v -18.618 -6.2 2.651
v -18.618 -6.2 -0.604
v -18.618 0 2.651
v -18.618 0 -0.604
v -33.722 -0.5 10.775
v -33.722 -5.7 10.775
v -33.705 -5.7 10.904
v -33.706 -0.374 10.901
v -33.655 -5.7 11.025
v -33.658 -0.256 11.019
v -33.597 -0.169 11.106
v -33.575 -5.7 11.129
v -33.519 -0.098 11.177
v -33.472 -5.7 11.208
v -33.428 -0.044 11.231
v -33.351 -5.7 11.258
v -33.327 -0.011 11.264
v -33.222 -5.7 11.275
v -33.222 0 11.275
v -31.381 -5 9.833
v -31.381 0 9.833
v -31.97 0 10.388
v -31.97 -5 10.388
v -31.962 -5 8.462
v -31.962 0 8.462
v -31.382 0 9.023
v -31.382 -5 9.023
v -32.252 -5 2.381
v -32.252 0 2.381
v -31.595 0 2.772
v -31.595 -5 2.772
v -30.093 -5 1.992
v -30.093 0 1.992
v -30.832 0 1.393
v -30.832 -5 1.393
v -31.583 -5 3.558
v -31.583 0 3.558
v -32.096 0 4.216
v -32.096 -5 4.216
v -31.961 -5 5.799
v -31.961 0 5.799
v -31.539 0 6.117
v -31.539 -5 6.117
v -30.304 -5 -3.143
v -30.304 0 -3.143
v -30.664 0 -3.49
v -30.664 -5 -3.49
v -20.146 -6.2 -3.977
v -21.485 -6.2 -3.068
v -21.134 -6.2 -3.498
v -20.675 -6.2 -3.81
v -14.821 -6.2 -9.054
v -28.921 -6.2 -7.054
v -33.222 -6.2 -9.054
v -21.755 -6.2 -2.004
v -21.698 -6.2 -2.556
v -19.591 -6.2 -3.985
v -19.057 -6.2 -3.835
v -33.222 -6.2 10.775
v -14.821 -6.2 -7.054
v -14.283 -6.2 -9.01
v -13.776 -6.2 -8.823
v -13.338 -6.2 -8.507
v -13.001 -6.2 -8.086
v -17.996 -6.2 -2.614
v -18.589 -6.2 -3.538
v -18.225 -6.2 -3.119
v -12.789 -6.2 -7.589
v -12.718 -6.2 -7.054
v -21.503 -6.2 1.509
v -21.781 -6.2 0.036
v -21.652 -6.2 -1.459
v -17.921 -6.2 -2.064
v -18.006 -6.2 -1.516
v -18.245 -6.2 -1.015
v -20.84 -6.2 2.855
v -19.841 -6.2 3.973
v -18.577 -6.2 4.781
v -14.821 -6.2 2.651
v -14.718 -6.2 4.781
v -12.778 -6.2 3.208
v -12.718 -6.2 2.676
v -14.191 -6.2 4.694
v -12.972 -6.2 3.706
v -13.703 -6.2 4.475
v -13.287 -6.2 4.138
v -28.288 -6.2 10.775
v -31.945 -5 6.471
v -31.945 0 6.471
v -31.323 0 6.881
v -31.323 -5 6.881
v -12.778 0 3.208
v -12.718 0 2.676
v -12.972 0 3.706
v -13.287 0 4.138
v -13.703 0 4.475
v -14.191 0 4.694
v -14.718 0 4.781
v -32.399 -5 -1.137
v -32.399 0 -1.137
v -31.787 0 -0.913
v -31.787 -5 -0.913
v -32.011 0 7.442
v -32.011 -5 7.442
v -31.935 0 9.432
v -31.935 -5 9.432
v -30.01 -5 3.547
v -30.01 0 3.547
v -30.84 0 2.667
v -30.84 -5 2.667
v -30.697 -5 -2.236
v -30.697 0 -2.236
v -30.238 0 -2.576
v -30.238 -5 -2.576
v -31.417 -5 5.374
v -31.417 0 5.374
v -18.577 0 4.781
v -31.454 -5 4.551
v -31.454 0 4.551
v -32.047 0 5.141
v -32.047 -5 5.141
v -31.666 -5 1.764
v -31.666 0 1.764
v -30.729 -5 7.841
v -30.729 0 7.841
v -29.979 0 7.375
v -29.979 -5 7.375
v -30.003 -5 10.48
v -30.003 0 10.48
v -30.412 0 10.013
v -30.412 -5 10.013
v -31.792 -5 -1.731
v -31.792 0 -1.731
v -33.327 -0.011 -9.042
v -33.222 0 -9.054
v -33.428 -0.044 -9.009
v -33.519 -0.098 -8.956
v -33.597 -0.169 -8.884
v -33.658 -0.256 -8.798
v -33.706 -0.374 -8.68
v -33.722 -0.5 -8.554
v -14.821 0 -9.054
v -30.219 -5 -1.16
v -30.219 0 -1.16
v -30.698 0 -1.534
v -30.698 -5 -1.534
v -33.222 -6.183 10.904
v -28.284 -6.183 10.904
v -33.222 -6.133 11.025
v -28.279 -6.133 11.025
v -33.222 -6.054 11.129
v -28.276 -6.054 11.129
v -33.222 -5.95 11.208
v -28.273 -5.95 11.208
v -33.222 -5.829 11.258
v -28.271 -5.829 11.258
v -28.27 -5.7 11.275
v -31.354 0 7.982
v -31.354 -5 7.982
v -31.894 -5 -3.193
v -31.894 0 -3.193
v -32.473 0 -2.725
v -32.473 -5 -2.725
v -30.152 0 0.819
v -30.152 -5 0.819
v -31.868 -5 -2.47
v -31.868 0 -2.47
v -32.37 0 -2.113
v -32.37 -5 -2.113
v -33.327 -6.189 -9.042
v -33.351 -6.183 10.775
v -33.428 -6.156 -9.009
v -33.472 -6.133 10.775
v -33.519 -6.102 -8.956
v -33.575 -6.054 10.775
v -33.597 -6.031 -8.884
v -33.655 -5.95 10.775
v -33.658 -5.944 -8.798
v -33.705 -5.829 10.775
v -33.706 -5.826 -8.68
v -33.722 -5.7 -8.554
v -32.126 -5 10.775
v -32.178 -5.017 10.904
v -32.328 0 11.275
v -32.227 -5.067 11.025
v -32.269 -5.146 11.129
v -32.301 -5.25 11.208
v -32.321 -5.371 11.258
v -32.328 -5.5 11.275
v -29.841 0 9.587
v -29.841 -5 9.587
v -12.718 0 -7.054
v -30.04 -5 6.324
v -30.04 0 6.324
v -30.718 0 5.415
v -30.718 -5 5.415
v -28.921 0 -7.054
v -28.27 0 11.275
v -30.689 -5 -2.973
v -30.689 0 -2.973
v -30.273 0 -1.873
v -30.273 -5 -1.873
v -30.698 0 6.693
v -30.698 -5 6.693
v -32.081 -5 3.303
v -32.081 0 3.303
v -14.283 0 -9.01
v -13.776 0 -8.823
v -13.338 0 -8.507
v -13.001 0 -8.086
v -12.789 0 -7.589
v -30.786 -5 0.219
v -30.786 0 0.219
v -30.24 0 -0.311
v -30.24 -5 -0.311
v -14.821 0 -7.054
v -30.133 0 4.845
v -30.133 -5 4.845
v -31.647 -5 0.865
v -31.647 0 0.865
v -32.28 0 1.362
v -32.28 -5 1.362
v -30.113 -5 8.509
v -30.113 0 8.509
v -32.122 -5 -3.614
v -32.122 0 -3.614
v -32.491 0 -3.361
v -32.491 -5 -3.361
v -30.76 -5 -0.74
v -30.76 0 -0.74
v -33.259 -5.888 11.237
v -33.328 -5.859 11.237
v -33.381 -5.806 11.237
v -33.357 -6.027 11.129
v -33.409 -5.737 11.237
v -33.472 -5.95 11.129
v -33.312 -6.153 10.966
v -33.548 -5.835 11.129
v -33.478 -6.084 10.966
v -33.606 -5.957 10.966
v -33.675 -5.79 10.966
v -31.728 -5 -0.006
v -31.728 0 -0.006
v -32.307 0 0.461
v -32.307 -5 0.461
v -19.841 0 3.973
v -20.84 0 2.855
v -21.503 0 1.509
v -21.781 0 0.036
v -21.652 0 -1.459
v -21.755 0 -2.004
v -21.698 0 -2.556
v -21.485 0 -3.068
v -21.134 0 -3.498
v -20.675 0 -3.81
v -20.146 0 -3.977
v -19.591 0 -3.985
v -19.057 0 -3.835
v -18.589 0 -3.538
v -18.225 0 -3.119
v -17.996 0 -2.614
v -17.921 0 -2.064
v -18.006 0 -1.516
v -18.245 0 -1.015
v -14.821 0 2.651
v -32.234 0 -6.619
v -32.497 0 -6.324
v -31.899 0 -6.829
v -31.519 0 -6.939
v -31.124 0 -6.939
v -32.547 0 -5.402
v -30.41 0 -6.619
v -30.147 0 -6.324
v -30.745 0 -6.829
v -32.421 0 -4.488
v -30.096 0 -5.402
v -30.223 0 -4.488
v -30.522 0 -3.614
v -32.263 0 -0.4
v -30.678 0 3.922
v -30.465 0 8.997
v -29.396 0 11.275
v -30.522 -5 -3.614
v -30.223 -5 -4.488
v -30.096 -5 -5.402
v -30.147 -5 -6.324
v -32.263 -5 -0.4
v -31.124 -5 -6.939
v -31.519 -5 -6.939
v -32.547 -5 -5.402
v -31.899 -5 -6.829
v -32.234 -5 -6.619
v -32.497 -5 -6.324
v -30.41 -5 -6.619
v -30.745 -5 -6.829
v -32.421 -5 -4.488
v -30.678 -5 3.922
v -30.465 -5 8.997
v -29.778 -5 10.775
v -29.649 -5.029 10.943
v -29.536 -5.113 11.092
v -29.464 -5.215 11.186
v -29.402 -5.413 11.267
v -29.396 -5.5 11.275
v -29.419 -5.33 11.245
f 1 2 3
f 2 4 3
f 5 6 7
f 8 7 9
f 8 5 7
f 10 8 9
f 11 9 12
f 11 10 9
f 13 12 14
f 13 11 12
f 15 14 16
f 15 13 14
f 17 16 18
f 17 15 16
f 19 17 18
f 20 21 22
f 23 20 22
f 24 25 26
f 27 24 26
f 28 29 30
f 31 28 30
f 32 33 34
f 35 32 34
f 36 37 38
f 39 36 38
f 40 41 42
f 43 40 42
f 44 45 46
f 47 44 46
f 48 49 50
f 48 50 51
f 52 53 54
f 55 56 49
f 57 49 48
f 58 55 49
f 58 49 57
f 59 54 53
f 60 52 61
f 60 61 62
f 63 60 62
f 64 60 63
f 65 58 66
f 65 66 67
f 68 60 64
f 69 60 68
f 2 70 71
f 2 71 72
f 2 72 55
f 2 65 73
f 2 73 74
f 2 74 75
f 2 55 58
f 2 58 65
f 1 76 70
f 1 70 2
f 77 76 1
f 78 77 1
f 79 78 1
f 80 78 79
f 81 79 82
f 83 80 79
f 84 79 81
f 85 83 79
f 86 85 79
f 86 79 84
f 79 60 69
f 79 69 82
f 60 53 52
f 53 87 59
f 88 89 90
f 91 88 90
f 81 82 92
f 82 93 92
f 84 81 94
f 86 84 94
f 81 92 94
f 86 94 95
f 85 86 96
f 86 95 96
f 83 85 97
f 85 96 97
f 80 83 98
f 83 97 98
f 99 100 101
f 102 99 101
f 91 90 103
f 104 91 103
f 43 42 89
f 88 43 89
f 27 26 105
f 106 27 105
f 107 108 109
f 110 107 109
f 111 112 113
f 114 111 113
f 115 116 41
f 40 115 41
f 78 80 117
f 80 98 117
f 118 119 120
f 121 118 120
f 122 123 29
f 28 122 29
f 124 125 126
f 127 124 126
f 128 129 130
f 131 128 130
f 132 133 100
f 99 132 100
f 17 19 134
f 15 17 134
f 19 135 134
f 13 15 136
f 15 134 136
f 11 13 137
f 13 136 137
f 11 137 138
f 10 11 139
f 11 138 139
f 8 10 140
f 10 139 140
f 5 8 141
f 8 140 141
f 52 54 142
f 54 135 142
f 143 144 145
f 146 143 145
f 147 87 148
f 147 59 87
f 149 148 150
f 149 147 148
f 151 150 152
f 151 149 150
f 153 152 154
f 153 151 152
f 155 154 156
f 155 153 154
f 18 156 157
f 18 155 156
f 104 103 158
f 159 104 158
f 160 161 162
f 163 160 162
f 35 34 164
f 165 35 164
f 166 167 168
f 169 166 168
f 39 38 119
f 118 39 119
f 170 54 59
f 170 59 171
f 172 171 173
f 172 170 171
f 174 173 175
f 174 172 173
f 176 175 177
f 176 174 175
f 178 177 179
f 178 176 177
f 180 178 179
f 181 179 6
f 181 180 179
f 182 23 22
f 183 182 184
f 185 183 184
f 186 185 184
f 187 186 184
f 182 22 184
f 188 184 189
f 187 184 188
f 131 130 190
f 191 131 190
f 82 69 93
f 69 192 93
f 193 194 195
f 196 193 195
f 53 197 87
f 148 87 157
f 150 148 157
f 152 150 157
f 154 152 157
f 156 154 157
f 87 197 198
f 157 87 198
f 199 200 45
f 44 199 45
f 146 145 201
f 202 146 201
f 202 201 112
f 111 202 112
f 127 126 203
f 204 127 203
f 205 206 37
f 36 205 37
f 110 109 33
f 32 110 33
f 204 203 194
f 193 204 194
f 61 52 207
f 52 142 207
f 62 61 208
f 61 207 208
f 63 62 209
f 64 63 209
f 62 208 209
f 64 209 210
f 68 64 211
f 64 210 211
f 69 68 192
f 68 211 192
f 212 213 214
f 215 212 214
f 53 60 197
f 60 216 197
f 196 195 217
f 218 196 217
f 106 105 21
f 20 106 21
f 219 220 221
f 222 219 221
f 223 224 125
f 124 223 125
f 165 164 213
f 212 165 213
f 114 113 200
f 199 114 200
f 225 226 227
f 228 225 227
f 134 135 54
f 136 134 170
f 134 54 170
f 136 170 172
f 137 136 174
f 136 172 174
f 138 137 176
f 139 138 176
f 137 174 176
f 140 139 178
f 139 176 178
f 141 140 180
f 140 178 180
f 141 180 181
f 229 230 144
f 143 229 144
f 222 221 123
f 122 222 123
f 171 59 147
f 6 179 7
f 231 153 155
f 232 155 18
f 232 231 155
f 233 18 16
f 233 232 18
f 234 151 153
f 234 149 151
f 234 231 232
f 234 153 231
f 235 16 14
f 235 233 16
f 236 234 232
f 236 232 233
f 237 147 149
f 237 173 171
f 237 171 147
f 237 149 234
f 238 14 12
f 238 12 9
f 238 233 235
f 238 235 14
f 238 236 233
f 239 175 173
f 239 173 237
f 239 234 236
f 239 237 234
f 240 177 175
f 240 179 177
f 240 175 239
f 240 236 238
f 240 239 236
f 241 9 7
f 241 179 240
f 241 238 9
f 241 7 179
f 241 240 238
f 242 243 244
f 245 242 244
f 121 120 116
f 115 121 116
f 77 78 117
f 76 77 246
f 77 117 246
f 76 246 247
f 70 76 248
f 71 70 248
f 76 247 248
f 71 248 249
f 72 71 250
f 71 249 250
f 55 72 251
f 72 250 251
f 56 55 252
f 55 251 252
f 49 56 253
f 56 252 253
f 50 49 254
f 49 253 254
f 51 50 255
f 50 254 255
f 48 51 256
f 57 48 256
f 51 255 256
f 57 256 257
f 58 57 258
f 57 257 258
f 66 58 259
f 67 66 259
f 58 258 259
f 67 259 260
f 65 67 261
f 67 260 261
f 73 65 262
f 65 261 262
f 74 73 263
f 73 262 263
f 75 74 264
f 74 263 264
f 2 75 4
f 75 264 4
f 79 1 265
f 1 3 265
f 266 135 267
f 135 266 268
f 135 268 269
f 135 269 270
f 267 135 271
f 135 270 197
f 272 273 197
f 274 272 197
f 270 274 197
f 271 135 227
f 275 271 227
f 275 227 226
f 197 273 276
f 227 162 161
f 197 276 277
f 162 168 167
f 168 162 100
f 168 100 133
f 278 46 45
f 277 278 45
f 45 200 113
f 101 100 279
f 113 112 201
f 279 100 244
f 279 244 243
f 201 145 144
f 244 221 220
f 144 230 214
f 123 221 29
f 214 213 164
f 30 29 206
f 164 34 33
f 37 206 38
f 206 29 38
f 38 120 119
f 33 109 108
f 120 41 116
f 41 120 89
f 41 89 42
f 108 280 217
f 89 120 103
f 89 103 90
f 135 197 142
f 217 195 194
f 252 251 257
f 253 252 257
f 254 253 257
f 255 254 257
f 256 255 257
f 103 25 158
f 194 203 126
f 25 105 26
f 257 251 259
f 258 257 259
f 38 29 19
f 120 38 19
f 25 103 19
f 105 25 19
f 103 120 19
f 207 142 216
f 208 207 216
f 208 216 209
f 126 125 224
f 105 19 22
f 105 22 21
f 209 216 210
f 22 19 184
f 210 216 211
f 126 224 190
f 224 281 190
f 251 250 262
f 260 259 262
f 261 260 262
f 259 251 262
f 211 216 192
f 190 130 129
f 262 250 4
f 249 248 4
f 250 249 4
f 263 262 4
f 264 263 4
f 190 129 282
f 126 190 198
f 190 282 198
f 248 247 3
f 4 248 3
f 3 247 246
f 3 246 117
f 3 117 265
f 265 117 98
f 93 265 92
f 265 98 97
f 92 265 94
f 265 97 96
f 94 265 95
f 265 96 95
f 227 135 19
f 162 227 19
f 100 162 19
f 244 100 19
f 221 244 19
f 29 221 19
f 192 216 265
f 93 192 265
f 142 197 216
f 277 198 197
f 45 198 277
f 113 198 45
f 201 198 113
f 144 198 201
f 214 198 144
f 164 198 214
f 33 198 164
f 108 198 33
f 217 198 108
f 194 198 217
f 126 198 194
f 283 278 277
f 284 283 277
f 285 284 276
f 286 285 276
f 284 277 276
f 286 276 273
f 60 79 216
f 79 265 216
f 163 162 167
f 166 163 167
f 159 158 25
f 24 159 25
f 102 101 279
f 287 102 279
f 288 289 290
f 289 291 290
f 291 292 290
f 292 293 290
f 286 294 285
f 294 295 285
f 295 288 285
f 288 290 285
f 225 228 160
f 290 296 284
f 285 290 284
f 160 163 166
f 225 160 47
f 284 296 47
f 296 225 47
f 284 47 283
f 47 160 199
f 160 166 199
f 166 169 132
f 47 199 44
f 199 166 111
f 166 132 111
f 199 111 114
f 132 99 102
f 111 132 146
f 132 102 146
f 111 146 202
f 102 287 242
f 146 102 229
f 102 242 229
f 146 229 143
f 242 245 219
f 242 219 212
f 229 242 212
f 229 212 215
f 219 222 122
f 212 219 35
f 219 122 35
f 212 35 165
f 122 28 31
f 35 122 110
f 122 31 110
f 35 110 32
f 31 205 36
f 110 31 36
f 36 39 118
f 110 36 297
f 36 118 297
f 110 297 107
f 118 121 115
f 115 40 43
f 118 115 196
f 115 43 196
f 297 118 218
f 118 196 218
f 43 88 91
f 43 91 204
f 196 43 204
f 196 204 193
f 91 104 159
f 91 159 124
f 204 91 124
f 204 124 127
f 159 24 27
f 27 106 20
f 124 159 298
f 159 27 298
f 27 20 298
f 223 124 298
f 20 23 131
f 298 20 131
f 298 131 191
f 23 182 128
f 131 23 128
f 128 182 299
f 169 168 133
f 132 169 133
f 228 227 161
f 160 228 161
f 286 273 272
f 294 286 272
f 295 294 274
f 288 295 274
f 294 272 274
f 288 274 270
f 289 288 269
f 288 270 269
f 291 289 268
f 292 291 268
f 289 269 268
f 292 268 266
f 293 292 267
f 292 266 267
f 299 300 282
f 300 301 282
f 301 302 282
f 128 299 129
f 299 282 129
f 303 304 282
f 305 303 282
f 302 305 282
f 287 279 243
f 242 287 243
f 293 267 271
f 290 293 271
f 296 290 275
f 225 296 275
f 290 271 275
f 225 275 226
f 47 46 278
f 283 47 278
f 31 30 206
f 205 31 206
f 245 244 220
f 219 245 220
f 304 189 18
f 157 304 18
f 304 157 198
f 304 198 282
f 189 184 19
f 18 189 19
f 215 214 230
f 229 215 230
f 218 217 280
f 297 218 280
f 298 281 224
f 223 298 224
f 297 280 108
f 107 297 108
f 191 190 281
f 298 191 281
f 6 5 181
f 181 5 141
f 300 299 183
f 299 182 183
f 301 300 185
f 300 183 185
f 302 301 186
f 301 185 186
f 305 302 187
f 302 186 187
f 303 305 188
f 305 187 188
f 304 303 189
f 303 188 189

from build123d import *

# Parameters (mm, degrees)
F1_DEPTH = 5
F3_DEPTH = 1.2
F4_R     = 0.5
F5_R     = 0.5


# Not quite as in the source:
# - a feature names something its author has since deleted; it is built from what else it names


with BuildPart() as f1:
    # F0 (on Front) → F1 (new body)
    with BuildSketch(Plane.XZ):
        with BuildLine():
            Line((-14.8212344469, -7.0536743234), (-28.9212344469, -7.0536743234))
            Line((-28.9212344469, -7.0536743234), (-28.2704247986, 11.2749813125))
            Line((-28.2704247986, 11.2749813125), (-28.9218110621, 11.2749813125))
            Line((-28.9218110621, 11.2749813125), (-29.3961446732, 11.2749813125))
            Line((-29.3961446732, 11.2749813125), (-30.0026237965, 10.4798590764))
            Line((-30.0026237965, 10.4798590764), (-30.4116010666, 10.0127095357))
            Line((-30.4116010666, 10.0127095357), (-29.8413168639, 9.5870485529))
            Line((-29.8413168639, 9.5870485529), (-30.4648373276, 8.9966477826))
            Line((-30.4648373276, 8.9966477826), (-30.1126744598, 8.5086580366))
            Line((-30.1126744598, 8.5086580366), (-30.7294670492, 7.841065526))
            Line((-30.7294670492, 7.841065526), (-29.9794543535, 7.3754815385))
            Line((-29.9794543535, 7.3754815385), (-30.6979243471, 6.6930544935))
            Line((-30.6979243471, 6.6930544935), (-30.0398971885, 6.3235382549))
            Line((-30.0398971885, 6.3235382549), (-30.7178553194, 5.4153422825))
            Line((-30.7178553194, 5.4153422825), (-30.1331207156, 4.8448727466))
            Line((-30.1331207156, 4.8448727466), (-30.6775290519, 3.9221365005))
            Line((-30.6775290519, 3.9221365005), (-30.0103500485, 3.5474810284))
            Line((-30.0103500485, 3.5474810284), (-30.8397468179, 2.6670382358))
            Line((-30.8397468179, 2.6670382358), (-30.092863366, 1.9921413623))
            Line((-30.092863366, 1.9921413623), (-30.8324787766, 1.3930242276))
            Line((-30.8324787766, 1.3930242276), (-30.1521252841, 0.8188846987))
            Line((-30.1521252841, 0.8188846987), (-30.7863112539, 0.2193431865))
            Line((-30.7863112539, 0.2193431865), (-30.2403476089, -0.3106002114))
            Line((-30.2403476089, -0.3106002114), (-30.7600591332, -0.7401480107))
            Line((-30.7600591332, -0.7401480107), (-30.2189867944, -1.1601685546))
            Line((-30.2189867944, -1.1601685546), (-30.697863549, -1.5337655786))
            Line((-30.697863549, -1.5337655786), (-30.272686854, -1.8727472052))
            Line((-30.272686854, -1.8727472052), (-30.6971091777, -2.2358004935))
            Line((-30.6971091777, -2.2358004935), (-30.2377268672, -2.5755497627))
            Line((-30.2377268672, -2.5755497627), (-30.6886751205, -2.9733050615))
            Line((-30.6886751205, -2.9733050615), (-30.3040016443, -3.1427361537))
            Line((-30.3040016443, -3.1427361537), (-30.6638516486, -3.4895907156))
            Line((-30.6638516486, -3.4895907156), (-30.5218110621, -3.6142014433))
            ThreePointArc((-30.5218110621, -3.6142014433), (-30.1374019423, -4.9418633416), (-30.1468068426, -6.3240239819))
            ThreePointArc((-30.1468068426, -6.3240239819), (-31.3218110621, -6.9525761479), (-32.4968152816, -6.3240239819))
            ThreePointArc((-32.4968152816, -6.3240239819), (-32.5062201819, -4.9418633416), (-32.1218110621, -3.6142014433))
            Line((-32.1218110621, -3.6142014433), (-32.4906222522, -3.3608889207))
            Line((-32.4906222522, -3.3608889207), (-31.8935625255, -3.1926007941))
            Line((-31.8935625255, -3.1926007941), (-32.4732549489, -2.725369297))
            Line((-32.4732549489, -2.725369297), (-31.8681225181, -2.469912637))
            Line((-31.8681225181, -2.469912637), (-32.3700606823, -2.1127404179))
            Line((-32.3700606823, -2.1127404179), (-31.7923054099, -1.7308852402))
            Line((-31.7923054099, -1.7308852402), (-32.3993675411, -1.1372548761))
            Line((-32.3993675411, -1.1372548761), (-31.787391752, -0.9133979911))
            Line((-31.787391752, -0.9133979911), (-32.2625972331, -0.3995953302))
            Line((-32.2625972331, -0.3995953302), (-31.7277535796, -0.0062950298))
            Line((-31.7277535796, -0.0062950298), (-32.307446003, 0.4609364551))
            Line((-32.307446003, 0.4609364551), (-31.6469706595, 0.8653931436))
            Line((-31.6469706595, 0.8653931436), (-32.2801508009, 1.3617775403))
            Line((-32.2801508009, 1.3617775403), (-31.6663235426, 1.7637870042))
            Line((-31.6663235426, 1.7637870042), (-32.2516188025, 2.381386701))
            Line((-32.2516188025, 2.381386701), (-31.5948762, 2.771951491))
            Line((-31.5948762, 2.771951491), (-32.0806577802, 3.3034612425))
            Line((-32.0806577802, 3.3034612425), (-31.5831229091, 3.5578387324))
            Line((-31.5831229091, 3.5578387324), (-32.0962779224, 4.2157475837))
            Line((-32.0962779224, 4.2157475837), (-31.4544551075, 4.5507424511))
            Line((-31.4544551075, 4.5507424511), (-32.0472158492, 5.1405578852))
            Line((-32.0472158492, 5.1405578852), (-31.4172059298, 5.3744916804))
            Line((-31.4172059298, 5.3744916804), (-31.9610573351, 5.7992665097))
            Line((-31.9610573351, 5.7992665097), (-31.5387845039, 6.1167036183))
            Line((-31.5387845039, 6.1167036183), (-31.9445021451, 6.4705028199))
            Line((-31.9445021451, 6.4705028199), (-31.3227176666, 6.8809650838))
            Line((-31.3227176666, 6.8809650838), (-32.0109948516, 7.44209392))
            Line((-32.0109948516, 7.44209392), (-31.3543491066, 7.9823648557))
            Line((-31.3543491066, 7.9823648557), (-31.9620929658, 8.4623992443))
            Line((-31.9620929658, 8.4623992443), (-31.3818305731, 9.0230396017))
            Line((-31.3818305731, 9.0230396017), (-31.9348983467, 9.4317272305))
            Line((-31.9348983467, 9.4317272305), (-31.3805788755, 9.8327174783))
            Line((-31.3805788755, 9.8327174783), (-31.9697335362, 10.3881815448))
            Line((-31.9697335362, 10.3881815448), (-32.3277190328, 11.2749813125))
            Line((-32.3277190328, 11.2749813125), (-33.7218110621, 11.2749813125))
            Line((-33.7218110621, 11.2749813125), (-33.7218110621, -9.0536743234))
            Line((-33.7218110621, -9.0536743234), (-14.8212344469, -9.0536743234))
            ThreePointArc((-14.8212344469, -9.0536743234), (-13.3381540877, -8.5073007085), (-12.7176528294, -7.0536743234))
            Line((-12.7176528294, -7.0536743234), (-12.7176528294, 2.67616936))
            ThreePointArc((-12.7176528294, 2.67616936), (-13.2872120436, 4.138004008), (-14.7182294446, 4.7810805465))
            Line((-14.7182294446, 4.7810805465), (-18.5773239742, 4.7810805465))
            ThreePointArc((-18.5773239742, 4.7810805465), (-21.2175552856, 2.2046060367), (-21.6524992138, -1.4587074984))
            ThreePointArc((-21.6524992138, -1.4587074984), (-19.3188346891, -3.9296286003), (-18.6177780154, -0.6039766724))
            Line((-18.6177780154, -0.6039766724), (-18.6177780154, 2.6510965993))
            Line((-18.6177780154, 2.6510965993), (-14.8212344469, 2.6510965993))
            Line((-14.8212344469, 2.6510965993), (-14.8212344469, -7.0536743234))
        make_face()
    extrude(amount=F1_DEPTH)

    # F2 (on face) → F3 (join)
    with BuildSketch(Plane.XZ.offset(5)):
        with BuildLine():
            Line((-32.6968152816, 11.2749813125), (-32.6968152816, -7.0536743234))
            Line((-32.6968152816, -7.0536743234), (-29.3961446732, -7.0536743234))
            Line((-29.3961446732, -7.0536743234), (-29.3961446732, 11.2749813125))
            Line((-29.3961446732, 11.2749813125), (-30.0026237965, 10.4798590764))
            Line((-30.0026237965, 10.4798590764), (-30.4116010666, 10.0127095357))
            Line((-30.4116010666, 10.0127095357), (-29.8413168639, 9.5870485529))
            Line((-29.8413168639, 9.5870485529), (-30.4648373276, 8.9966477826))
            Line((-30.4648373276, 8.9966477826), (-30.1126744598, 8.5086580366))
            Line((-30.1126744598, 8.5086580366), (-30.7294670492, 7.841065526))
            Line((-30.7294670492, 7.841065526), (-29.9794543535, 7.3754815385))
            Line((-29.9794543535, 7.3754815385), (-30.6979243471, 6.6930544935))
            Line((-30.6979243471, 6.6930544935), (-30.0398971885, 6.3235382549))
            Line((-30.0398971885, 6.3235382549), (-30.7178553194, 5.4153422825))
            Line((-30.7178553194, 5.4153422825), (-30.1331207156, 4.8448727466))
            Line((-30.1331207156, 4.8448727466), (-30.6775290519, 3.9221365005))
            Line((-30.6775290519, 3.9221365005), (-30.0103500485, 3.5474810284))
            Line((-30.0103500485, 3.5474810284), (-30.8397468179, 2.6670382358))
            Line((-30.8397468179, 2.6670382358), (-30.092863366, 1.9921413623))
            Line((-30.092863366, 1.9921413623), (-30.8324787766, 1.3930242276))
            Line((-30.8324787766, 1.3930242276), (-30.1521252841, 0.8188846987))
            Line((-30.1521252841, 0.8188846987), (-30.7863112539, 0.2193431865))
            Line((-30.7863112539, 0.2193431865), (-30.2403476089, -0.3106002114))
            Line((-30.2403476089, -0.3106002114), (-30.7600591332, -0.7401480107))
            Line((-30.7600591332, -0.7401480107), (-30.2189867944, -1.1601685546))
            Line((-30.2189867944, -1.1601685546), (-30.697863549, -1.5337655786))
            Line((-30.697863549, -1.5337655786), (-30.272686854, -1.8727472052))
            Line((-30.272686854, -1.8727472052), (-30.6971091777, -2.2358004935))
            Line((-30.6971091777, -2.2358004935), (-30.2377268672, -2.5755497627))
            Line((-30.2377268672, -2.5755497627), (-30.6886751205, -2.9733050615))
            Line((-30.6886751205, -2.9733050615), (-30.3040016443, -3.1427361537))
            Line((-30.3040016443, -3.1427361537), (-30.6638516486, -3.4895907156))
            Line((-30.6638516486, -3.4895907156), (-30.5218110621, -3.6142014433))
            ThreePointArc((-30.5218110621, -3.6142014433), (-30.1374019423, -4.9418633416), (-30.1468068426, -6.3240239819))
            ThreePointArc((-30.1468068426, -6.3240239819), (-31.3218110621, -6.9525761479), (-32.4968152816, -6.3240239819))
            ThreePointArc((-32.4968152816, -6.3240239819), (-32.5062201819, -4.9418633416), (-32.1218110621, -3.6142014433))
            Line((-32.1218110621, -3.6142014433), (-32.4906222522, -3.3608889207))
            Line((-32.4906222522, -3.3608889207), (-31.8935625255, -3.1926007941))
            Line((-31.8935625255, -3.1926007941), (-32.4732549489, -2.725369297))
            Line((-32.4732549489, -2.725369297), (-31.8681225181, -2.469912637))
            Line((-31.8681225181, -2.469912637), (-32.3700606823, -2.1127404179))
            Line((-32.3700606823, -2.1127404179), (-31.7923054099, -1.7308852402))
            Line((-31.7923054099, -1.7308852402), (-32.3993675411, -1.1372548761))
            Line((-32.3993675411, -1.1372548761), (-31.787391752, -0.9133979911))
            Line((-31.787391752, -0.9133979911), (-32.2625972331, -0.3995953302))
            Line((-32.2625972331, -0.3995953302), (-31.7277535796, -0.0062950298))
            Line((-31.7277535796, -0.0062950298), (-32.307446003, 0.4609364551))
            Line((-32.307446003, 0.4609364551), (-31.6469706595, 0.8653931436))
            Line((-31.6469706595, 0.8653931436), (-32.2801508009, 1.3617775403))
            Line((-32.2801508009, 1.3617775403), (-31.6663235426, 1.7637870042))
            Line((-31.6663235426, 1.7637870042), (-32.2516188025, 2.381386701))
            Line((-32.2516188025, 2.381386701), (-31.5948762, 2.771951491))
            Line((-31.5948762, 2.771951491), (-32.0806577802, 3.3034612425))
            Line((-32.0806577802, 3.3034612425), (-31.5831229091, 3.5578387324))
            Line((-31.5831229091, 3.5578387324), (-32.0962779224, 4.2157475837))
            Line((-32.0962779224, 4.2157475837), (-31.4544551075, 4.5507424511))
            Line((-31.4544551075, 4.5507424511), (-32.0472158492, 5.1405578852))
            Line((-32.0472158492, 5.1405578852), (-31.4172059298, 5.3744916804))
            Line((-31.4172059298, 5.3744916804), (-31.9610573351, 5.7992665097))
            Line((-31.9610573351, 5.7992665097), (-31.5387845039, 6.1167036183))
            Line((-31.5387845039, 6.1167036183), (-31.9445021451, 6.4705028199))
            Line((-31.9445021451, 6.4705028199), (-31.3227176666, 6.8809650838))
            Line((-31.3227176666, 6.8809650838), (-32.0109948516, 7.44209392))
            Line((-32.0109948516, 7.44209392), (-31.3543491066, 7.9823648557))
            Line((-31.3543491066, 7.9823648557), (-31.9620929658, 8.4623992443))
            Line((-31.9620929658, 8.4623992443), (-31.3818305731, 9.0230396017))
            Line((-31.3818305731, 9.0230396017), (-31.9348983467, 9.4317272305))
            Line((-31.9348983467, 9.4317272305), (-31.3805788755, 9.8327174783))
            Line((-31.3805788755, 9.8327174783), (-31.9697335362, 10.3881815448))
            Line((-31.9697335362, 10.3881815448), (-32.3277190328, 11.2749813125))
            Line((-32.3277190328, 11.2749813125), (-32.6968152816, 11.2749813125))
        make_face()
        with BuildLine():
            Line((-30.0026237965, 10.4798590764), (-29.3961446732, 11.2749813125))
            Line((-29.3961446732, 11.2749813125), (-32.3277190328, 11.2749813125))
            Line((-32.3277190328, 11.2749813125), (-31.9697335362, 10.3881815448))
            Line((-31.9697335362, 10.3881815448), (-31.3805788755, 9.8327174783))
            Line((-31.3805788755, 9.8327174783), (-31.9348983467, 9.4317272305))
            Line((-31.9348983467, 9.4317272305), (-31.3818305731, 9.0230396017))
            Line((-31.3818305731, 9.0230396017), (-31.9620929658, 8.4623992443))
            Line((-31.9620929658, 8.4623992443), (-31.3543491066, 7.9823648557))
            Line((-31.3543491066, 7.9823648557), (-32.0109948516, 7.44209392))
            Line((-32.0109948516, 7.44209392), (-31.3227176666, 6.8809650838))
            Line((-31.3227176666, 6.8809650838), (-31.9445021451, 6.4705028199))
            Line((-31.9445021451, 6.4705028199), (-31.5387845039, 6.1167036183))
            Line((-31.5387845039, 6.1167036183), (-31.9610573351, 5.7992665097))
            Line((-31.9610573351, 5.7992665097), (-31.4172059298, 5.3744916804))
            Line((-31.4172059298, 5.3744916804), (-32.0472158492, 5.1405578852))
            Line((-32.0472158492, 5.1405578852), (-31.4544551075, 4.5507424511))
            Line((-31.4544551075, 4.5507424511), (-32.0962779224, 4.2157475837))
            Line((-32.0962779224, 4.2157475837), (-31.5831229091, 3.5578387324))
            Line((-31.5831229091, 3.5578387324), (-32.0806577802, 3.3034612425))
            Line((-32.0806577802, 3.3034612425), (-31.5948762, 2.771951491))
            Line((-31.5948762, 2.771951491), (-32.2516188025, 2.381386701))
            Line((-32.2516188025, 2.381386701), (-31.6663235426, 1.7637870042))
            Line((-31.6663235426, 1.7637870042), (-32.2801508009, 1.3617775403))
            Line((-32.2801508009, 1.3617775403), (-31.6469706595, 0.8653931436))
            Line((-31.6469706595, 0.8653931436), (-32.307446003, 0.4609364551))
            Line((-32.307446003, 0.4609364551), (-31.7277535796, -0.0062950298))
            Line((-31.7277535796, -0.0062950298), (-32.2625972331, -0.3995953302))
            Line((-32.2625972331, -0.3995953302), (-31.787391752, -0.9133979911))
            Line((-31.787391752, -0.9133979911), (-32.3993675411, -1.1372548761))
            Line((-32.3993675411, -1.1372548761), (-31.7923054099, -1.7308852402))
            Line((-31.7923054099, -1.7308852402), (-32.3700606823, -2.1127404179))
            Line((-32.3700606823, -2.1127404179), (-31.8681225181, -2.469912637))
            Line((-31.8681225181, -2.469912637), (-32.4732549489, -2.725369297))
            Line((-32.4732549489, -2.725369297), (-31.8935625255, -3.1926007941))
            Line((-31.8935625255, -3.1926007941), (-32.4906222522, -3.3608889207))
            Line((-32.4906222522, -3.3608889207), (-32.1218110621, -3.6142014433))
            ThreePointArc((-32.1218110621, -3.6142014433), (-32.5062201819, -4.9418633416), (-32.4968152816, -6.3240239819))
            ThreePointArc((-32.4968152816, -6.3240239819), (-31.3218110621, -6.9525761479), (-30.1468068426, -6.3240239819))
            ThreePointArc((-30.1468068426, -6.3240239819), (-30.1374019423, -4.9418633416), (-30.5218110621, -3.6142014433))
            Line((-30.5218110621, -3.6142014433), (-30.6638516486, -3.4895907156))
            Line((-30.6638516486, -3.4895907156), (-30.3040016443, -3.1427361537))
            Line((-30.3040016443, -3.1427361537), (-30.6886751205, -2.9733050615))
            Line((-30.6886751205, -2.9733050615), (-30.2377268672, -2.5755497627))
            Line((-30.2377268672, -2.5755497627), (-30.6971091777, -2.2358004935))
            Line((-30.6971091777, -2.2358004935), (-30.272686854, -1.8727472052))
            Line((-30.272686854, -1.8727472052), (-30.697863549, -1.5337655786))
            Line((-30.697863549, -1.5337655786), (-30.2189867944, -1.1601685546))
            Line((-30.2189867944, -1.1601685546), (-30.7600591332, -0.7401480107))
            Line((-30.7600591332, -0.7401480107), (-30.2403476089, -0.3106002114))
            Line((-30.2403476089, -0.3106002114), (-30.7863112539, 0.2193431865))
            Line((-30.7863112539, 0.2193431865), (-30.1521252841, 0.8188846987))
            Line((-30.1521252841, 0.8188846987), (-30.8324787766, 1.3930242276))
            Line((-30.8324787766, 1.3930242276), (-30.092863366, 1.9921413623))
            Line((-30.092863366, 1.9921413623), (-30.8397468179, 2.6670382358))
            Line((-30.8397468179, 2.6670382358), (-30.0103500485, 3.5474810284))
            Line((-30.0103500485, 3.5474810284), (-30.6775290519, 3.9221365005))
            Line((-30.6775290519, 3.9221365005), (-30.1331207156, 4.8448727466))
            Line((-30.1331207156, 4.8448727466), (-30.7178553194, 5.4153422825))
            Line((-30.7178553194, 5.4153422825), (-30.0398971885, 6.3235382549))
            Line((-30.0398971885, 6.3235382549), (-30.6979243471, 6.6930544935))
            Line((-30.6979243471, 6.6930544935), (-29.9794543535, 7.3754815385))
            Line((-29.9794543535, 7.3754815385), (-30.7294670492, 7.841065526))
            Line((-30.7294670492, 7.841065526), (-30.1126744598, 8.5086580366))
            Line((-30.1126744598, 8.5086580366), (-30.4648373276, 8.9966477826))
            Line((-30.4648373276, 8.9966477826), (-29.8413168639, 9.5870485529))
            Line((-29.8413168639, 9.5870485529), (-30.4116010666, 10.0127095357))
            Line((-30.4116010666, 10.0127095357), (-30.0026237965, 10.4798590764))
        make_face()
        with BuildLine():
            Line((-29.3961446732, -7.0536743234), (-32.6968152816, -7.0536743234))
            Line((-32.6968152816, -7.0536743234), (-32.6968152816, 11.2749813125))
            Line((-32.6968152816, 11.2749813125), (-33.7218110621, 11.2749813125))
            Line((-33.7218110621, 11.2749813125), (-33.7218110621, -9.0536743234))
            Line((-33.7218110621, -9.0536743234), (-14.8212344469, -9.0536743234))
            ThreePointArc((-14.8212344469, -9.0536743234), (-13.3381540877, -8.5073007085), (-12.7176528294, -7.0536743234))
            Line((-12.7176528294, -7.0536743234), (-12.7176528294, 2.67616936))
            ThreePointArc((-12.7176528294, 2.67616936), (-13.2872120436, 4.138004008), (-14.7182294446, 4.7810805465))
            Line((-14.7182294446, 4.7810805465), (-18.5773239742, 4.7810805465))
            ThreePointArc((-18.5773239742, 4.7810805465), (-21.2175552856, 2.2046060367), (-21.6524992138, -1.4587074984))
            ThreePointArc((-21.6524992138, -1.4587074984), (-19.3188346891, -3.9296286003), (-18.6177780154, -0.6039766724))
            Line((-18.6177780154, -0.6039766724), (-18.6177780154, 2.6510965993))
            Line((-18.6177780154, 2.6510965993), (-14.8212344469, 2.6510965993))
            Line((-14.8212344469, 2.6510965993), (-14.8212344469, -7.0536743234))
            Line((-14.8212344469, -7.0536743234), (-28.9212344469, -7.0536743234))
            Line((-28.9212344469, -7.0536743234), (-28.2704247986, 11.2749813125))
            Line((-28.2704247986, 11.2749813125), (-29.3961446732, 11.2749813125))
            Line((-29.3961446732, 11.2749813125), (-29.3961446732, -7.0536743234))
        make_face()
    extrude(amount=F3_DEPTH)

    # F4
    f4_edges = [f1.edges().sort_by_distance(p)[0] for p in [
        (-30.861932, -5, 11.274981),
    ]]
    fillet(f4_edges, radius=F4_R)

    # F5
    f5_edges = [f1.edges().sort_by_distance(p)[0] for p in [
        (-33.721811, 0, 1.110653),
        (-33.721811, -6.2, 1.110653),
        (-33.721811, -3.1, -9.053674),
        (-30.996118, -6.2, 11.274981),
        (-33.721811, -3.1, 11.274981),
    ]]
    fillet(f5_edges, radius=F5_R)


solid = f1.part
